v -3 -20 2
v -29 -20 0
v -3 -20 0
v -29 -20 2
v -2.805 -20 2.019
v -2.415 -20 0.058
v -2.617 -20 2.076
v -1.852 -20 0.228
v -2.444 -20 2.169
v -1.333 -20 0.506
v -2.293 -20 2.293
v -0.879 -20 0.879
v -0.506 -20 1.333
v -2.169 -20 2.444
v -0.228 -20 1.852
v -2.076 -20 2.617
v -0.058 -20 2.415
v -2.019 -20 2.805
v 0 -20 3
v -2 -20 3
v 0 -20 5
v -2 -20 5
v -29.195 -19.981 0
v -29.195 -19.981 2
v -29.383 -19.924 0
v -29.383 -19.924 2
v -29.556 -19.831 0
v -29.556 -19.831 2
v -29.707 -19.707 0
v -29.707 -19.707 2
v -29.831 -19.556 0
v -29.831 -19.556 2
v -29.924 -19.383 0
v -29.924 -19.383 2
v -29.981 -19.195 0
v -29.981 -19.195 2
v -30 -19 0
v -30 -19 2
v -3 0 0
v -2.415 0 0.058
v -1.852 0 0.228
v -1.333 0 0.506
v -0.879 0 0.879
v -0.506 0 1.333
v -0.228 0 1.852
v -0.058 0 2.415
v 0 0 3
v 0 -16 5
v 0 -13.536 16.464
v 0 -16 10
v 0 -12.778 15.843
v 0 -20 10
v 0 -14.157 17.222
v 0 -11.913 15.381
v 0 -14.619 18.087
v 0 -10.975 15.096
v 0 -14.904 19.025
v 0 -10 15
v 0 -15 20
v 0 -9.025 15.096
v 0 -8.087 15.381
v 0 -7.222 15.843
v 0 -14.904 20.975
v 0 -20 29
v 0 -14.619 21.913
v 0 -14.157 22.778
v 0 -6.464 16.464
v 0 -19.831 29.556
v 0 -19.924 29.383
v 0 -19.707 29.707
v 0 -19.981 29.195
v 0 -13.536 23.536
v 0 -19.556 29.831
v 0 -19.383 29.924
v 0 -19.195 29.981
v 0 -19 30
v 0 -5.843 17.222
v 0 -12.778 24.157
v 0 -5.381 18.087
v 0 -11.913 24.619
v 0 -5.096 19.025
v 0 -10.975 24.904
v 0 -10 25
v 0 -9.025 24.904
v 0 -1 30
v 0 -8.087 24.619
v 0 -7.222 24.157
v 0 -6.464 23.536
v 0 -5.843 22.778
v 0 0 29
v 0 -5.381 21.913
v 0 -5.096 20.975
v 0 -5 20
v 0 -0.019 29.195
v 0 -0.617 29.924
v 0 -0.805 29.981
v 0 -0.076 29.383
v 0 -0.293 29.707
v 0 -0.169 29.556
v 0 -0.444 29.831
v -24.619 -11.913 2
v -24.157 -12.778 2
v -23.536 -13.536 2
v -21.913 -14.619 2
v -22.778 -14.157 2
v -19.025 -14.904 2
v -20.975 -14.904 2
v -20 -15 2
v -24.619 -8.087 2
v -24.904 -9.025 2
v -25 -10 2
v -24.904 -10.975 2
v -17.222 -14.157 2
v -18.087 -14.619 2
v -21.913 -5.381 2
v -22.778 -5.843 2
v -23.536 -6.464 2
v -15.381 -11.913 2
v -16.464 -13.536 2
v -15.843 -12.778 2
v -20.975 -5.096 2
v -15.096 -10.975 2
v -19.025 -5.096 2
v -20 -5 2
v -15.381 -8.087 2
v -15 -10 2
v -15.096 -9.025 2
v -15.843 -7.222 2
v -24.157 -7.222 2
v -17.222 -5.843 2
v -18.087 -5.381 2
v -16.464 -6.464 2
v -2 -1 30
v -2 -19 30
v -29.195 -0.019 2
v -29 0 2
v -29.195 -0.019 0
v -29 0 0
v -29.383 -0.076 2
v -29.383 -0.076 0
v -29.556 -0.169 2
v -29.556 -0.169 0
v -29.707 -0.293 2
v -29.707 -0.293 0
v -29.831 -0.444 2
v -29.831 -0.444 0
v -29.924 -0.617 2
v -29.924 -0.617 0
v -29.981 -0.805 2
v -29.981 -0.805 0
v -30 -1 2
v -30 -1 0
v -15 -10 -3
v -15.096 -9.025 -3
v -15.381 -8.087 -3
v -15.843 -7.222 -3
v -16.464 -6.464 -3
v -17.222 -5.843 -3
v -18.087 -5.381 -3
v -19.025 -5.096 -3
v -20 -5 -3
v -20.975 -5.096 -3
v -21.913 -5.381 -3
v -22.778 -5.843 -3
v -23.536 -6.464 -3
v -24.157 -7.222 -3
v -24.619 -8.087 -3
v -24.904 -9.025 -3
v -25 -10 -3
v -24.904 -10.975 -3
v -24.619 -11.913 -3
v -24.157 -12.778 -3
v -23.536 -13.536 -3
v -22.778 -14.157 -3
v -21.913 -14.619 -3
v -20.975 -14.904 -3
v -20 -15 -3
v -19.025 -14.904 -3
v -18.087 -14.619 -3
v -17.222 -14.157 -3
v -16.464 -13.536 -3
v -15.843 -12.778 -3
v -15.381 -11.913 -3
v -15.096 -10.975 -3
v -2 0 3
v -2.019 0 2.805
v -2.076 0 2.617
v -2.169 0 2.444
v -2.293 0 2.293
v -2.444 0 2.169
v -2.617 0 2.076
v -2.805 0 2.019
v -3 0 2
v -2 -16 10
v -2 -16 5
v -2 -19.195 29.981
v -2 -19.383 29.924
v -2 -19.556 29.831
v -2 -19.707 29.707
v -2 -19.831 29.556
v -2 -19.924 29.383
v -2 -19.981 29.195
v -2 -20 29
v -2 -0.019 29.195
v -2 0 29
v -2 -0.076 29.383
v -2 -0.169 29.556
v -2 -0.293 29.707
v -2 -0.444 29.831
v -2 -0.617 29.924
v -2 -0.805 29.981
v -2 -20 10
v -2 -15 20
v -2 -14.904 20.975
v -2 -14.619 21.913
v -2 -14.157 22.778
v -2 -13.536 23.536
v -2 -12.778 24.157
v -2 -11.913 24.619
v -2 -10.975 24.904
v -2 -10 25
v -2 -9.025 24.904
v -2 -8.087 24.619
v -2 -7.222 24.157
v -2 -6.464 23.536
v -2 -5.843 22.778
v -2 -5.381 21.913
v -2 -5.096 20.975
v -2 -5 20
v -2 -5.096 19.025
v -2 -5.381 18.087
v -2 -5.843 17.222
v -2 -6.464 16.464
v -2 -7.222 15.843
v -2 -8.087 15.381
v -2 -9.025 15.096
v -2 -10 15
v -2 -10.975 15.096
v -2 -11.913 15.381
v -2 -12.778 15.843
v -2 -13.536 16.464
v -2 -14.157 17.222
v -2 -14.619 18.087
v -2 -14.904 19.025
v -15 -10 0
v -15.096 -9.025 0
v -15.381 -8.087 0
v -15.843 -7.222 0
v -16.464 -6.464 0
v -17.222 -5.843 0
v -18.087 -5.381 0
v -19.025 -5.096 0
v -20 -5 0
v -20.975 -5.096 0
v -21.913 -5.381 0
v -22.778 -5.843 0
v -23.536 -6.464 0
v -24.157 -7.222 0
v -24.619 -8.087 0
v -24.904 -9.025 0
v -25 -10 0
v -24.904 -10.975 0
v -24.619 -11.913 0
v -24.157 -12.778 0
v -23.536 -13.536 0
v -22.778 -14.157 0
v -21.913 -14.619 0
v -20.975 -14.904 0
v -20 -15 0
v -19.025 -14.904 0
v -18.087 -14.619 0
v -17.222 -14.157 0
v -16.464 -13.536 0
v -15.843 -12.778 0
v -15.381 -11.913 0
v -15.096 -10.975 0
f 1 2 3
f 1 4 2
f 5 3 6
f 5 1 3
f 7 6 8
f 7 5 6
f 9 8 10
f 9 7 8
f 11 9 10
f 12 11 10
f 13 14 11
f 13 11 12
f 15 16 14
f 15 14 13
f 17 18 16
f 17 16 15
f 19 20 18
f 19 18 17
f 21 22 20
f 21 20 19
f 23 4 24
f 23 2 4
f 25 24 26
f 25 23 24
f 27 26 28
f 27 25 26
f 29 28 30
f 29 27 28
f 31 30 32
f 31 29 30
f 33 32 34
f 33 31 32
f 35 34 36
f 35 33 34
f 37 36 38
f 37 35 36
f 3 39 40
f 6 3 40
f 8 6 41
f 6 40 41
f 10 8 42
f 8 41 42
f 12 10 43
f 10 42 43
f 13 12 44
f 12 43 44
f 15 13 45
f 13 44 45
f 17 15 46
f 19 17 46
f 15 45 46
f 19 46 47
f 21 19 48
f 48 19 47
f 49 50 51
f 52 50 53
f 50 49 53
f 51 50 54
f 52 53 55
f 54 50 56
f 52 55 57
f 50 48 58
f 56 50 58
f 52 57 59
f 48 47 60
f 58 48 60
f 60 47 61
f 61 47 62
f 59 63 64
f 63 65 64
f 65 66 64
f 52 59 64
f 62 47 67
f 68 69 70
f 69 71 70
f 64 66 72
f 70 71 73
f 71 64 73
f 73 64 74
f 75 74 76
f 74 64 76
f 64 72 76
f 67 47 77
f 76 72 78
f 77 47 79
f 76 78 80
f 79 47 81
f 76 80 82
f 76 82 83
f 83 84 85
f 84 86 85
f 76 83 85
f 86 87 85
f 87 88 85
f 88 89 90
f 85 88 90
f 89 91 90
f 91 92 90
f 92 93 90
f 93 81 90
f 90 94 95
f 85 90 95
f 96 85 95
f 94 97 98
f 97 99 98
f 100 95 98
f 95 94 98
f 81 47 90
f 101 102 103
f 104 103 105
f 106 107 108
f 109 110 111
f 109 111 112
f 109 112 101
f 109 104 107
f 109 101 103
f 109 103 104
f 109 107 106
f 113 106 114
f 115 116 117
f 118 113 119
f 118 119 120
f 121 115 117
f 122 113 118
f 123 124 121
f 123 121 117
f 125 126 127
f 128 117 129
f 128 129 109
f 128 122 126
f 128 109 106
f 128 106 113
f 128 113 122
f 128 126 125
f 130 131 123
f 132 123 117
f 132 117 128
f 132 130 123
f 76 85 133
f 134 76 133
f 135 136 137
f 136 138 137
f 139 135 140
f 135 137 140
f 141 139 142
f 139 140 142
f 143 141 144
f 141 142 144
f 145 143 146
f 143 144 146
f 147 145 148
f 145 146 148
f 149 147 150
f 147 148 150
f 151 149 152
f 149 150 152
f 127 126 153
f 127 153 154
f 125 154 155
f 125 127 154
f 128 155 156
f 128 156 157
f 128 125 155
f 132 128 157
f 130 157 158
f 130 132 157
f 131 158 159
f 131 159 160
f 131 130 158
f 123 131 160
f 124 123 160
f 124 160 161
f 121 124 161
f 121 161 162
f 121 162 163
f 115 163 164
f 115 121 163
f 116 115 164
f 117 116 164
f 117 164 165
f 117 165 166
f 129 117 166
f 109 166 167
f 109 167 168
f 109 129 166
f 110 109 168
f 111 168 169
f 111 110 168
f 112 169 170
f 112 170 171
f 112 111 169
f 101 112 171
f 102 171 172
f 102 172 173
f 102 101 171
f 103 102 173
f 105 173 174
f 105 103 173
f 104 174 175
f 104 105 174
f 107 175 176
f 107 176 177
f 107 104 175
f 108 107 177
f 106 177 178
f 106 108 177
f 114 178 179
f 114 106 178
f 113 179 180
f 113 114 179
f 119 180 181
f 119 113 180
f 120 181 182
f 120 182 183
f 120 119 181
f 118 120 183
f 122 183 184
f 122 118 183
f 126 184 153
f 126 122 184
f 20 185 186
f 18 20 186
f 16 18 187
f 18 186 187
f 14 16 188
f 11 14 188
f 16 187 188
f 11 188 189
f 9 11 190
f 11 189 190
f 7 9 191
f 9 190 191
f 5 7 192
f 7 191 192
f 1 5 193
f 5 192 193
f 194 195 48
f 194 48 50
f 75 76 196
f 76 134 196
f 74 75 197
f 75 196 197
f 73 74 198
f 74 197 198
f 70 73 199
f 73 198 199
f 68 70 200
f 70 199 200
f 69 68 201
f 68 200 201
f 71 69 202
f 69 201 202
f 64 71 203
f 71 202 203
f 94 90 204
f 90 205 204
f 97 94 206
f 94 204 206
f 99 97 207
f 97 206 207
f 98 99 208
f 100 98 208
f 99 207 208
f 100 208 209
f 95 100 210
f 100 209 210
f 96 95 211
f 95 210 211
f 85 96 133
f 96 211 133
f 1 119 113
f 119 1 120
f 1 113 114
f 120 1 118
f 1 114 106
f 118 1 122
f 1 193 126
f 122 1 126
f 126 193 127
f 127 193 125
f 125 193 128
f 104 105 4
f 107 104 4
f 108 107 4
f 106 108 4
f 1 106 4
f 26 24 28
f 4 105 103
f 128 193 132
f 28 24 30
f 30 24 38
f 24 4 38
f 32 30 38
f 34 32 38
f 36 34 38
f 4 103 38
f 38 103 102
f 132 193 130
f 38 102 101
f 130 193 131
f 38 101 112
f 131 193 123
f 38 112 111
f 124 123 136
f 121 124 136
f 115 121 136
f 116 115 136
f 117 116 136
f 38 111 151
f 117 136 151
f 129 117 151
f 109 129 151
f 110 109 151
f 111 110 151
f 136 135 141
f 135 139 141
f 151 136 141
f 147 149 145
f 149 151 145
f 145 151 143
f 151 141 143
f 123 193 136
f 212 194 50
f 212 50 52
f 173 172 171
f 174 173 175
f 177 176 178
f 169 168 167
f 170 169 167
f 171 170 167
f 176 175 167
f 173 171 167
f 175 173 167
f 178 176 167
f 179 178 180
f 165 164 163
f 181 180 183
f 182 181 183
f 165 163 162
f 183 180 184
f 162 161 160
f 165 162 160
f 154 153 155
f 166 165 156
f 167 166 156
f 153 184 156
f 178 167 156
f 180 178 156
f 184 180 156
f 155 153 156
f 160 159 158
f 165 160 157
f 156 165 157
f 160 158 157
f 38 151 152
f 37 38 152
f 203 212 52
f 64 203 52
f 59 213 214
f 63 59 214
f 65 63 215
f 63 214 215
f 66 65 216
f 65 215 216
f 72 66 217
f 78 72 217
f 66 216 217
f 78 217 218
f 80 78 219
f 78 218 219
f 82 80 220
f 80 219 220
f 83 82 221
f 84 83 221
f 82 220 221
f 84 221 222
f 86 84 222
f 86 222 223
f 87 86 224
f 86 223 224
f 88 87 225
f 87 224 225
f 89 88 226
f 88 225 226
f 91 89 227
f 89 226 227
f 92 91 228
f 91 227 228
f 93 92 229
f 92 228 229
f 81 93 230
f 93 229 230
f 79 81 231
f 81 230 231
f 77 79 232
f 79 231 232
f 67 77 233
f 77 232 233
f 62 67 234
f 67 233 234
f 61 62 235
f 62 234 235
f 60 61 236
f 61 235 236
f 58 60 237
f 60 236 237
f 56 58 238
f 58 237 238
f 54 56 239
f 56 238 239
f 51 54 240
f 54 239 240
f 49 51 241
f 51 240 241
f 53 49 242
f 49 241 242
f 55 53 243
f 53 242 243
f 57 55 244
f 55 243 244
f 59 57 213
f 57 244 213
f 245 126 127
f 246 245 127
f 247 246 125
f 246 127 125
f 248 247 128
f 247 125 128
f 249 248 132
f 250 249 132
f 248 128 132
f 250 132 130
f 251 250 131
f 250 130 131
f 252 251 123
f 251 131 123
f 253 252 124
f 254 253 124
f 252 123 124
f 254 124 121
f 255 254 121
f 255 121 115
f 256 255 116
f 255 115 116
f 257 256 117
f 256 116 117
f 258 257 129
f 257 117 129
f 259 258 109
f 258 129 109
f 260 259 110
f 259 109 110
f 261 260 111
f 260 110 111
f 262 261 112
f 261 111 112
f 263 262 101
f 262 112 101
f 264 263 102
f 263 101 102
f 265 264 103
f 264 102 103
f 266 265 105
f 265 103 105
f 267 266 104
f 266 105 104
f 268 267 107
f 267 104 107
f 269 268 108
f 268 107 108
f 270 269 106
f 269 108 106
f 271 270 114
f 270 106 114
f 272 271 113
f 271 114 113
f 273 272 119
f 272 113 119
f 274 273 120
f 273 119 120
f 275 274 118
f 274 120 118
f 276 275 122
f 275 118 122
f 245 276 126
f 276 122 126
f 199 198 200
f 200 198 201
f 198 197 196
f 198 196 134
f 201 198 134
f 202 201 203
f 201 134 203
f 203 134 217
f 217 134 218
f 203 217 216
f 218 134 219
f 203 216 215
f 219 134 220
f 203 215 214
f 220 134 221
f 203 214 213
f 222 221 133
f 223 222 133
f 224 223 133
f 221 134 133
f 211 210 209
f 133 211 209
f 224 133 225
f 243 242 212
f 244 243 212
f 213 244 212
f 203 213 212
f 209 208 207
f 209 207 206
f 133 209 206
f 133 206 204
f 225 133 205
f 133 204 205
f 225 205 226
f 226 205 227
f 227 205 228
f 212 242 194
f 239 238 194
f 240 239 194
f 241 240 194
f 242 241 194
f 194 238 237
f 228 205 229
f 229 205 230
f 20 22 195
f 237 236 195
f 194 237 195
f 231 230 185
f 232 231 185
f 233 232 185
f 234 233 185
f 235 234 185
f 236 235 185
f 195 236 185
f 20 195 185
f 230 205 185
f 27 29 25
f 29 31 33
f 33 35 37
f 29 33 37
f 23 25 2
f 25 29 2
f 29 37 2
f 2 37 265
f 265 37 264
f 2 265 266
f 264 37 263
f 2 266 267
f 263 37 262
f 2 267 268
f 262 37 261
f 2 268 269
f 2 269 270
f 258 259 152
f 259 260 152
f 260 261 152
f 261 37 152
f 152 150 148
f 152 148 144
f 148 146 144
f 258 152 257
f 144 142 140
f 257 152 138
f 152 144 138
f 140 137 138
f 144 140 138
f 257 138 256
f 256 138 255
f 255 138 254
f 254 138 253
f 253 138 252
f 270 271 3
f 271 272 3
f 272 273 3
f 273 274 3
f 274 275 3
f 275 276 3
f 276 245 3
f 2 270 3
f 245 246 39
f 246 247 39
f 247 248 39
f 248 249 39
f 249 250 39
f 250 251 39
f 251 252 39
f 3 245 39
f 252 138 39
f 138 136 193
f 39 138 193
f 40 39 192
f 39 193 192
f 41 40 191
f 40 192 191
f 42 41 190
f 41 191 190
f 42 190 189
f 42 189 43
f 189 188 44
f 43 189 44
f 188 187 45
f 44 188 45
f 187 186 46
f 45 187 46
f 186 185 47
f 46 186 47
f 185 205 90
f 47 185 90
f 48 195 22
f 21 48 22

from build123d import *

# Parameters (mm, degrees)
F1_DEPTH  = 20
F2_R      = 5
F3_DEPTH  = 2
F4_R      = 5
F5_DEPTH  = 2
F6_W      = 4
F6_H      = 5
F7_DEPTH  = 2
F8_R      = 1
F9_R      = 5
F10_DEPTH = 5


with BuildPart() as f1:
    # F0 (on Front) → F1 (new body)
    with BuildSketch(Plane.XZ):
        with BuildLine():
            ThreePointArc((-3, 0), (-0.87868, 0.87868), (0, 3))
            Line((0, 3), (0, 30))
            Line((0, 30), (-2, 30))
            Line((-2, 30), (-2, 3))
            ThreePointArc((-2, 3), (-2.292893, 2.292893), (-3, 2))
            Line((-3, 2), (-30, 2))
            Line((-30, 2), (-30, 0))
            Line((-30, 0), (-3, 0))
        make_face()
    extrude(amount=F1_DEPTH)

    # F2 (on face) → F3 (cut, through all)
    with BuildSketch(Plane.XY.offset(2)):
        with Locations((-20, -10)):
            Circle(F2_R)
    extrude(amount=-F3_DEPTH, mode=Mode.SUBTRACT)

    # F4 (on face) → F5 (cut, through all)
    with BuildSketch(Plane(origin=(-2, 0, 0), x_dir=(0, -1, 0), z_dir=(-1, 0, 0))):
        with Locations((10, 20)):
            Circle(F4_R)
    extrude(amount=-F5_DEPTH, mode=Mode.SUBTRACT)

    # F6 (on face) → F7 (cut, through all)
    with BuildSketch(Plane(origin=(-2, 0, 0), x_dir=(0, -1, 0), z_dir=(-1, 0, 0))):
        with Locations((18, 7.5)):
            Rectangle(F6_W, F6_H)
    extrude(amount=-F7_DEPTH, mode=Mode.SUBTRACT)

    # F8
    f8_edges = [f1.edges().sort_by_distance(p)[0] for p in [
        (-1, -20, 30),
        (-1, 0, 30),
        (-30, -20, 1),
        (-30, 0, 1),
    ]]
    fillet(f8_edges, radius=F8_R)


with BuildPart() as f10:
    # F9 (on face) → F10 (new body)
    with BuildSketch(Plane.XY.offset(2)):
        with Locations((-20, -10)):
            Circle(F9_R)
    extrude(amount=-F10_DEPTH)


solid = Compound([f1.part, f10.part])
